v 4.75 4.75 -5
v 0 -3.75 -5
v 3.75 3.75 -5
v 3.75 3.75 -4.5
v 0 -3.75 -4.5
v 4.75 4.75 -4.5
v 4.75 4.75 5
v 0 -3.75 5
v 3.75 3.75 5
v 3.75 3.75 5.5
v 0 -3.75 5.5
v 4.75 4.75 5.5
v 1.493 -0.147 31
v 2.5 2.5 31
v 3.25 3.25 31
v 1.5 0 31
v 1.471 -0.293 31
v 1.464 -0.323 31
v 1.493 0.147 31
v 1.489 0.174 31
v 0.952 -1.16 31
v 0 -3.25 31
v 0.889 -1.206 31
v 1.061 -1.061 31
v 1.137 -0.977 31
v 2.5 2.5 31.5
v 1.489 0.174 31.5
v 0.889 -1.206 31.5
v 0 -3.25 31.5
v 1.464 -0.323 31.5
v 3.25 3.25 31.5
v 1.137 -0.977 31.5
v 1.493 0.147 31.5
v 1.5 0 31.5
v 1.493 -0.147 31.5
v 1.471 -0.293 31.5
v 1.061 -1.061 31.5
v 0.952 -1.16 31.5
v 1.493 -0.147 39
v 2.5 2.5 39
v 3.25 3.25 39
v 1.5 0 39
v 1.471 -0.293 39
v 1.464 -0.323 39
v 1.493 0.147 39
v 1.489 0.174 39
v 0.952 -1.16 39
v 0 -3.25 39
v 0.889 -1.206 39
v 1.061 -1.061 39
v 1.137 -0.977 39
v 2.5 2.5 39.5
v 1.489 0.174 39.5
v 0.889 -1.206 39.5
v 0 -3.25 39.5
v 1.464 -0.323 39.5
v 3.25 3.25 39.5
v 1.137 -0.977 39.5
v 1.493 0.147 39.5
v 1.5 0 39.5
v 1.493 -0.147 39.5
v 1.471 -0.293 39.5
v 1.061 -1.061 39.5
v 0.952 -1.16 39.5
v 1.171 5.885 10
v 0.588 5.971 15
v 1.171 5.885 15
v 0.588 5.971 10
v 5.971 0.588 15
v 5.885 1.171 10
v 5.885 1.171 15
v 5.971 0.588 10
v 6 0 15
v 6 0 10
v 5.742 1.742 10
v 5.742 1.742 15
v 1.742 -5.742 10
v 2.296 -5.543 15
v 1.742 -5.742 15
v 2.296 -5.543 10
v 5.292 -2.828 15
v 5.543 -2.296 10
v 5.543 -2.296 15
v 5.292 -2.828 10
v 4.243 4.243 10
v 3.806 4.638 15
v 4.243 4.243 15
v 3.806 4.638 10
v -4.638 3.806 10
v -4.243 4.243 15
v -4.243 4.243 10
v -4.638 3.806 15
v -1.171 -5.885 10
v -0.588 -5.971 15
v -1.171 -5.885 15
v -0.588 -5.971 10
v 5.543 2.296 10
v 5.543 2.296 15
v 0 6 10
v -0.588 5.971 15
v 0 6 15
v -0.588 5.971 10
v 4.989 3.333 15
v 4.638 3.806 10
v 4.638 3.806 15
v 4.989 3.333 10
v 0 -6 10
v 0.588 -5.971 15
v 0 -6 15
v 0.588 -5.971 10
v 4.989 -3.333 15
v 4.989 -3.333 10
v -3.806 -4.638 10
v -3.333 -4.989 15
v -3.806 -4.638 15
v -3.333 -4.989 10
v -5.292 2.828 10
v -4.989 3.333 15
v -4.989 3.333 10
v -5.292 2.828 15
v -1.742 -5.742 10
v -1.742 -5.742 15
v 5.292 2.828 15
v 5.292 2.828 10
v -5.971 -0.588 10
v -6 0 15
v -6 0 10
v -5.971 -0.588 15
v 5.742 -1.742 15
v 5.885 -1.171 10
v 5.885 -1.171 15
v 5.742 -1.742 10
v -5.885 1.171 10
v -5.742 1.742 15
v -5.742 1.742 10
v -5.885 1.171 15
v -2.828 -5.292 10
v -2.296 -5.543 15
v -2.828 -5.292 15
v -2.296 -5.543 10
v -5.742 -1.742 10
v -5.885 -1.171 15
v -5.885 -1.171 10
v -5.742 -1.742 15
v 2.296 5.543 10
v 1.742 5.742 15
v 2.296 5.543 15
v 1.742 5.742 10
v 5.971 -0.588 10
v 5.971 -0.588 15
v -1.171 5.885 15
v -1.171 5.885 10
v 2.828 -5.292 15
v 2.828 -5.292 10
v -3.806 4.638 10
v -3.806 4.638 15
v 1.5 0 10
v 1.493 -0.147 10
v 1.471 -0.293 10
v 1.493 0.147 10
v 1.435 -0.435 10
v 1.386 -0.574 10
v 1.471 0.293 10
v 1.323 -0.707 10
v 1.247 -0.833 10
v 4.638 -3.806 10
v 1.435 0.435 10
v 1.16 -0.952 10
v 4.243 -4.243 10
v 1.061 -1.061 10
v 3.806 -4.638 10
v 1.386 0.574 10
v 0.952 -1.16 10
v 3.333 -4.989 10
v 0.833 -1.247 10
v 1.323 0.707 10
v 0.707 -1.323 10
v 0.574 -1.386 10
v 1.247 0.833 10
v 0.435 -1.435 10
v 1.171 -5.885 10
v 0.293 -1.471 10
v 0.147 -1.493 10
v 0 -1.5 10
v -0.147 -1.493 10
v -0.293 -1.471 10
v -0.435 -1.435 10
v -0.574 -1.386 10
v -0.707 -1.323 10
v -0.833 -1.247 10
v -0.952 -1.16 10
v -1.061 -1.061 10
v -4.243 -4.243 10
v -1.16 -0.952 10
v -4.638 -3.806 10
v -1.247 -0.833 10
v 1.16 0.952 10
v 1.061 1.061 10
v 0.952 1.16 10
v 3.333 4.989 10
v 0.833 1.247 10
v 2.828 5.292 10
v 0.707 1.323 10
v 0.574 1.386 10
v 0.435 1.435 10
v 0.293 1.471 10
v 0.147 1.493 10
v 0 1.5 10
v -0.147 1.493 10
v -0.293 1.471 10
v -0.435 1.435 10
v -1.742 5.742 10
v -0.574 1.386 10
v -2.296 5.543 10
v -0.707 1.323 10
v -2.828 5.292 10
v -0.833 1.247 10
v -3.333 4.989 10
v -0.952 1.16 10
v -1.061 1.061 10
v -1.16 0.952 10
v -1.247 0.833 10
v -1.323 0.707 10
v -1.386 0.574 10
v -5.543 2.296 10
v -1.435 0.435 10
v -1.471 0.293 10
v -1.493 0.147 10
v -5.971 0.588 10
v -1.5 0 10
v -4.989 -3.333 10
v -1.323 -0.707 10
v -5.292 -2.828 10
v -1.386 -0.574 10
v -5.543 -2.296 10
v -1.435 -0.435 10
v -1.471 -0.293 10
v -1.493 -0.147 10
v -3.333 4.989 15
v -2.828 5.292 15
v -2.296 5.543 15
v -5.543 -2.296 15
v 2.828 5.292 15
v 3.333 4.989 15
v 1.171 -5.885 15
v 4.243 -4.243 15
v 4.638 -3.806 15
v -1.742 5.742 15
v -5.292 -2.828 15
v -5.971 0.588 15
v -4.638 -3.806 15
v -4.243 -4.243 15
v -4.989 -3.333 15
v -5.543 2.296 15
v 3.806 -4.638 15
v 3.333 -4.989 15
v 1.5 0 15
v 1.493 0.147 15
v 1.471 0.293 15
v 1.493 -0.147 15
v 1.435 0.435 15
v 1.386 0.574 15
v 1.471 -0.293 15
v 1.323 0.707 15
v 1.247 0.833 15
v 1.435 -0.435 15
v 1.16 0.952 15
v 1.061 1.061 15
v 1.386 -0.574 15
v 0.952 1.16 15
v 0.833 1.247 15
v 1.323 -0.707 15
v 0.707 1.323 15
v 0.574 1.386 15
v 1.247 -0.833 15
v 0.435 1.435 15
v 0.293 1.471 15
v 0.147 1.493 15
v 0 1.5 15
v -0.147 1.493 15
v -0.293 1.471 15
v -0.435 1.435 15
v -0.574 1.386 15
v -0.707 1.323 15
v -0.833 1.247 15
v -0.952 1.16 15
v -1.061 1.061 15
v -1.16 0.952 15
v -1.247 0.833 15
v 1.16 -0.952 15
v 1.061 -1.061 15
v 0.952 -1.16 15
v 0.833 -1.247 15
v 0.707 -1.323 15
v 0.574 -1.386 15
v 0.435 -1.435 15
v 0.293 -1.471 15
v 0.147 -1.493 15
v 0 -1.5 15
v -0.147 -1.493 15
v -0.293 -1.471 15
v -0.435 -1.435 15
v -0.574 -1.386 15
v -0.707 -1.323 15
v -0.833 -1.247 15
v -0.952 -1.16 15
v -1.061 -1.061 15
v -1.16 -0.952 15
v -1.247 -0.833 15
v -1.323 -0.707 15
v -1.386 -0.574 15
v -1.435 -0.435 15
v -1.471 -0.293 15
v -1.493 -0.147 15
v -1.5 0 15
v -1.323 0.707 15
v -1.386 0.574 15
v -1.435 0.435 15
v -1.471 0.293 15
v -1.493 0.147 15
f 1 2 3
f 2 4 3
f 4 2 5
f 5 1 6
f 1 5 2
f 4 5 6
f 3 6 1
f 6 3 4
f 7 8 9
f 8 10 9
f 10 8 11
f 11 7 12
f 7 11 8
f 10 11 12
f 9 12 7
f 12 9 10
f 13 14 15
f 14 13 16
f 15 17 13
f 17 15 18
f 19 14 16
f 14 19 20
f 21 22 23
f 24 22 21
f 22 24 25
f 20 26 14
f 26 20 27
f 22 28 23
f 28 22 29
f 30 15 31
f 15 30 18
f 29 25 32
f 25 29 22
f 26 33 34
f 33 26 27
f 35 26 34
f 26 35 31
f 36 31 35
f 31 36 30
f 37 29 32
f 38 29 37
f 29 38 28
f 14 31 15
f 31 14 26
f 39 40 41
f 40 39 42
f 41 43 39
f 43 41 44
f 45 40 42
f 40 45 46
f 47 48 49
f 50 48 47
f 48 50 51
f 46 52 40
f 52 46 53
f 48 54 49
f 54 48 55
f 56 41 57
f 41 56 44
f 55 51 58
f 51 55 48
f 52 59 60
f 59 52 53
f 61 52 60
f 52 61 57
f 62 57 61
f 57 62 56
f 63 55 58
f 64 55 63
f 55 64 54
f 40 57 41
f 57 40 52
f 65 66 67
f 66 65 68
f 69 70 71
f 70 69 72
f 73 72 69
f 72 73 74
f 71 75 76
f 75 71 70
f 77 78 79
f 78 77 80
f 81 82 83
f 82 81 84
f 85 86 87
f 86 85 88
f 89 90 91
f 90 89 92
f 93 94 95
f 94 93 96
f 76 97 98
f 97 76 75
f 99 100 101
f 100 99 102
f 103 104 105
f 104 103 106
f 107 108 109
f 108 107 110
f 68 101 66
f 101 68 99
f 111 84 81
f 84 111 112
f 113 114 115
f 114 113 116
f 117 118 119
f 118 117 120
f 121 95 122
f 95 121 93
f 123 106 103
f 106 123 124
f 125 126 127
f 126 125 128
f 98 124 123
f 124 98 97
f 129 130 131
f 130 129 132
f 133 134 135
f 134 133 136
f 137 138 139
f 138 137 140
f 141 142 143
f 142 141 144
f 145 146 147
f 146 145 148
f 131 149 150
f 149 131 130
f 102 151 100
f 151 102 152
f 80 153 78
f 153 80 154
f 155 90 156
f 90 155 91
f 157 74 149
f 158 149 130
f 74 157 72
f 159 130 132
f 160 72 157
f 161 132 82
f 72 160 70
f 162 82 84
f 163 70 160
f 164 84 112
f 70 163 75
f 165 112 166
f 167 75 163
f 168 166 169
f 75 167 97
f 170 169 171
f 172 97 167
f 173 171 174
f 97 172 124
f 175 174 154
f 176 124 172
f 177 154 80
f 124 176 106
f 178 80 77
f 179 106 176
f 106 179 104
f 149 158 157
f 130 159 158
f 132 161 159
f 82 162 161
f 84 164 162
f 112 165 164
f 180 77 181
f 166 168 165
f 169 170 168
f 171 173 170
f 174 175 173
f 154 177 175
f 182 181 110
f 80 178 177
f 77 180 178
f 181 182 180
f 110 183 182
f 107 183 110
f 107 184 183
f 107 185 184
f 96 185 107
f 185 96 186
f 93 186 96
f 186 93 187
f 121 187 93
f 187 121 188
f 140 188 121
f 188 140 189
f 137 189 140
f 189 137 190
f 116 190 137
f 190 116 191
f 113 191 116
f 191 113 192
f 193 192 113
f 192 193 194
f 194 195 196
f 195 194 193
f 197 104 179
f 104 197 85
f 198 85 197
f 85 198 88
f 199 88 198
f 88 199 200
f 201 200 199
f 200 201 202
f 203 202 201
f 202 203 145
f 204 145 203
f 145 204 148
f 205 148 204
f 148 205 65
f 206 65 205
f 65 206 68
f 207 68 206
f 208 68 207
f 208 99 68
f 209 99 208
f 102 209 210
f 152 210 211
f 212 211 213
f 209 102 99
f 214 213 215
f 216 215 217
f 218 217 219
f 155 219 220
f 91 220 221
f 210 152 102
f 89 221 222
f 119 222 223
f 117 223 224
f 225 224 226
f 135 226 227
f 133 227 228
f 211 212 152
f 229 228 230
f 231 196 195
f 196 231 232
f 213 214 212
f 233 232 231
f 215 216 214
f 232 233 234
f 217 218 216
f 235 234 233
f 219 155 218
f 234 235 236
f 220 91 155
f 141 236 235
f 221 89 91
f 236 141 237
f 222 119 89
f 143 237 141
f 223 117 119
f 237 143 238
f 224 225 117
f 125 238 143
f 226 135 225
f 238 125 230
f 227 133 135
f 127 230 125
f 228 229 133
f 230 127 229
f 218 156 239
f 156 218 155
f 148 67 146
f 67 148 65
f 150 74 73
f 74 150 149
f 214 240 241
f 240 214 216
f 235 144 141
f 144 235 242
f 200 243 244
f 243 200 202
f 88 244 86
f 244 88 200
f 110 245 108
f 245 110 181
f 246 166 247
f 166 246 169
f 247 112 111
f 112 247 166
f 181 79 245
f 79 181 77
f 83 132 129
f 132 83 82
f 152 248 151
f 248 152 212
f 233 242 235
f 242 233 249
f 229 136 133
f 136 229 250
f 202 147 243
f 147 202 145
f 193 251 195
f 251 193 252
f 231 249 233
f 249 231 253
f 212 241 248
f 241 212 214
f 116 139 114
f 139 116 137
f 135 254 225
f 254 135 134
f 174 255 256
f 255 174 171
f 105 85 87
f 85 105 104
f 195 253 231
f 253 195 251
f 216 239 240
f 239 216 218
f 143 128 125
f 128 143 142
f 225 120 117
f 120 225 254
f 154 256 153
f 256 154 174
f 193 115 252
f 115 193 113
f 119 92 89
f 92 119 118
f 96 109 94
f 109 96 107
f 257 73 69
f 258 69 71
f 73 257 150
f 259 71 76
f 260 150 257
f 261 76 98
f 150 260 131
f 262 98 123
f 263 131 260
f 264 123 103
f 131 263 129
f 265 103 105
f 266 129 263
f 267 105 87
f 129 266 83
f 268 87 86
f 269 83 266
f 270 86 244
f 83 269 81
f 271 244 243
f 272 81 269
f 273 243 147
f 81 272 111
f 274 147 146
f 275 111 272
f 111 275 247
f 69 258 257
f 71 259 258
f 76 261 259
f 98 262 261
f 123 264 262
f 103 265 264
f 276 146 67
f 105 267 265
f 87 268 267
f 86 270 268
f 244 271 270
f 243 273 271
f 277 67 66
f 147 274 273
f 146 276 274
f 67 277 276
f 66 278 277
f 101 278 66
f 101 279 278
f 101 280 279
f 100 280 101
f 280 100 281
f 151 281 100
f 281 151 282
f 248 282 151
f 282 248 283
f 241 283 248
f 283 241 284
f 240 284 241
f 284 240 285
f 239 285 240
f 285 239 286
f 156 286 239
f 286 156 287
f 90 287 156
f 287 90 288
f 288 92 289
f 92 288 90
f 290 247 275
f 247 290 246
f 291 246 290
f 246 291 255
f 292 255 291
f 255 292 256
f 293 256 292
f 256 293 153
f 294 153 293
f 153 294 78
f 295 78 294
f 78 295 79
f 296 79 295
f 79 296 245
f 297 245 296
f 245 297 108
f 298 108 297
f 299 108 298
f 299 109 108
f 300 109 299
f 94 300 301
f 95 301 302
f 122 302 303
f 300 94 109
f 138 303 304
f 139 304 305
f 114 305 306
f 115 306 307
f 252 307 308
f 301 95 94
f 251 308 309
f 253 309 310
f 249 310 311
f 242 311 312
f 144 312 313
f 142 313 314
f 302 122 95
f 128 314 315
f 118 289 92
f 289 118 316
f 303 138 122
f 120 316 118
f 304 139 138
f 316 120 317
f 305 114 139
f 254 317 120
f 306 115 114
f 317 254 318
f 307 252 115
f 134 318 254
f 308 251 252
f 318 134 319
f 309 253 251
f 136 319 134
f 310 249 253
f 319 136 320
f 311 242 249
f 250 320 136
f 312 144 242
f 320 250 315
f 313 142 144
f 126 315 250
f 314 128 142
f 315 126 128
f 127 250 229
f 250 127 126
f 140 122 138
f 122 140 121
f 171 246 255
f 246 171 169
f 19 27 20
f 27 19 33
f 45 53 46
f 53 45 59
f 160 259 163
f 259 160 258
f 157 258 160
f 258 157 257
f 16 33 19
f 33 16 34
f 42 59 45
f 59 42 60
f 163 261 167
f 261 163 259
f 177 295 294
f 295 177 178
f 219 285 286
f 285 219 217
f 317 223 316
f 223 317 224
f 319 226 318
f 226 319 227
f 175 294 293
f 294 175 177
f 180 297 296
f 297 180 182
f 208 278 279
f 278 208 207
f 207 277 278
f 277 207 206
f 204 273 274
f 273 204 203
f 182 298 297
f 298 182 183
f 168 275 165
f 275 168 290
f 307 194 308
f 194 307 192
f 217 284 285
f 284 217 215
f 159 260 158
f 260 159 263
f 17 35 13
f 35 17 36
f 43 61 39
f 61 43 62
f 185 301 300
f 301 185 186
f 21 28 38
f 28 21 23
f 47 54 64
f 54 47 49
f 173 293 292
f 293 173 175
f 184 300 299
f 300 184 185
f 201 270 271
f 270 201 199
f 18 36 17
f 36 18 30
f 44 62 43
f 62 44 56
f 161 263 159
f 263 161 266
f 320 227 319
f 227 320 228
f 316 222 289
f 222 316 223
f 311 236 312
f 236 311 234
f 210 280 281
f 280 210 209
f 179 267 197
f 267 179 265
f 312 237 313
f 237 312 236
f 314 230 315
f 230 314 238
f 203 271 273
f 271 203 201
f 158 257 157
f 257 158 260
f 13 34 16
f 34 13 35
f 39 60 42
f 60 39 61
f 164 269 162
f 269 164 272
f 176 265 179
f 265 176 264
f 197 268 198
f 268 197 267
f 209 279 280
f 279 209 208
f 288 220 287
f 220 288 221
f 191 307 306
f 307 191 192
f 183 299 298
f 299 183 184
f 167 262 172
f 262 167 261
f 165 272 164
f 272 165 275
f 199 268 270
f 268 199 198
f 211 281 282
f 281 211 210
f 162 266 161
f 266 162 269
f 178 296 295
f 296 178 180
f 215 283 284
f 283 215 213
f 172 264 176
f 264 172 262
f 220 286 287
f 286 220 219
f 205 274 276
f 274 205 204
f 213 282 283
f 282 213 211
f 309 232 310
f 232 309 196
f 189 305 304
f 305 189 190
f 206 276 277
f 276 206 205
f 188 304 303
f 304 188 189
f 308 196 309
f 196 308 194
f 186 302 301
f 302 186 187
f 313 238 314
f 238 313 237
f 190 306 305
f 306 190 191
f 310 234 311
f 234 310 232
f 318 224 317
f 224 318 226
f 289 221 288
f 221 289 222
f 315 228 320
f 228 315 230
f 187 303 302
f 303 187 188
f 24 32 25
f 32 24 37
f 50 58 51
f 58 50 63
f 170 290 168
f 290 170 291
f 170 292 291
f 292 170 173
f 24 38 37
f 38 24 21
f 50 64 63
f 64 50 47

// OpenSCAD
// Hose-barb reducer: 8 mm ID -> 5 mm ID
// Print orientation: standing upright along +Z

$fn = 64;

// ---- Dimensions (mm) ----
tube_id_8     = 8;    // 8 mm tubing inner diameter
tube_id_5     = 5;    // 5 mm tubing inner diameter
bore          = 3;    // through-bore diameter
collar_d      = 12;   // reducer collar diameter (z = 20..25)

 Barb_h_8     = 10;   // 8 mm tubing barb height
 Barb_od_8_b  = 7.5;  // 8 mm barb outer diameter (bottom)
 Barb_od_8_t  = 9.5;  // 8 mm barb outer diameter (top)

 Barb_h_5     = 8;    // 5 mm tubing barb height
 Barb_od_5_b  = 6.5;  // 5 mm barb outer diameter (bottom)
 Barb_od_5_t  = 5.0;  // 5 mm barb outer diameter (top)

eps           = 0.5;  // cutter overshoot

// ---- Derived ----
z0 = 0;
z8 = z0 + Barb_h_8;              // 10
zC = z8 + 5;                      // 15 (collar start)
z2 = zC + collar_d;               // 27 (collar end)
z5 = z2 + Barb_h_5;               // 35
zT = z5 + Barb_h_8;               // 45 (top of second 8 mm barb)

// ---- Model ----
difference() {
    union() {
        // 8 mm tubing: two identical barbs, stacked
        for (s = [-1, 1])
            translate([0, 0, z0 + s * Barb_h_8 / 2])
                linear_extrude(height = eps)
                    polygon([
                        [0, -Barb_od_8_b / 2],
                        [Barb_od_8_t / 2, Barb_od_8_t / 2],
                        [Barb_od_8_b / 2, Barb_od_8_b / 2]
                    ]);

        // 5 mm tubing: two identical barbs, stacked
        for (s = [-1, 1])
            translate([0, 0, z5 + s * Barb_h_5 / 2])
                linear_extrude(height = eps)
                    polygon([
                        [0, -Barb_od_5_b / 2],
                        [Barb_od_5_t / 2, Barb_od_5_t / 2],
                        [Barb_od_5_b / 2, Barb_od_5_b / 2]
                    ]);

        // Collar: z = 20 to z = 25 (sits between the two tube sizes)
        translate([0, 0, z8])
            cylinder(d = collar_d, h = 5);
    }

    // Through-bore along Z
    translate([0, 0, -eps])
        cylinder(d = bore, h = zT + 2 * eps);
}
